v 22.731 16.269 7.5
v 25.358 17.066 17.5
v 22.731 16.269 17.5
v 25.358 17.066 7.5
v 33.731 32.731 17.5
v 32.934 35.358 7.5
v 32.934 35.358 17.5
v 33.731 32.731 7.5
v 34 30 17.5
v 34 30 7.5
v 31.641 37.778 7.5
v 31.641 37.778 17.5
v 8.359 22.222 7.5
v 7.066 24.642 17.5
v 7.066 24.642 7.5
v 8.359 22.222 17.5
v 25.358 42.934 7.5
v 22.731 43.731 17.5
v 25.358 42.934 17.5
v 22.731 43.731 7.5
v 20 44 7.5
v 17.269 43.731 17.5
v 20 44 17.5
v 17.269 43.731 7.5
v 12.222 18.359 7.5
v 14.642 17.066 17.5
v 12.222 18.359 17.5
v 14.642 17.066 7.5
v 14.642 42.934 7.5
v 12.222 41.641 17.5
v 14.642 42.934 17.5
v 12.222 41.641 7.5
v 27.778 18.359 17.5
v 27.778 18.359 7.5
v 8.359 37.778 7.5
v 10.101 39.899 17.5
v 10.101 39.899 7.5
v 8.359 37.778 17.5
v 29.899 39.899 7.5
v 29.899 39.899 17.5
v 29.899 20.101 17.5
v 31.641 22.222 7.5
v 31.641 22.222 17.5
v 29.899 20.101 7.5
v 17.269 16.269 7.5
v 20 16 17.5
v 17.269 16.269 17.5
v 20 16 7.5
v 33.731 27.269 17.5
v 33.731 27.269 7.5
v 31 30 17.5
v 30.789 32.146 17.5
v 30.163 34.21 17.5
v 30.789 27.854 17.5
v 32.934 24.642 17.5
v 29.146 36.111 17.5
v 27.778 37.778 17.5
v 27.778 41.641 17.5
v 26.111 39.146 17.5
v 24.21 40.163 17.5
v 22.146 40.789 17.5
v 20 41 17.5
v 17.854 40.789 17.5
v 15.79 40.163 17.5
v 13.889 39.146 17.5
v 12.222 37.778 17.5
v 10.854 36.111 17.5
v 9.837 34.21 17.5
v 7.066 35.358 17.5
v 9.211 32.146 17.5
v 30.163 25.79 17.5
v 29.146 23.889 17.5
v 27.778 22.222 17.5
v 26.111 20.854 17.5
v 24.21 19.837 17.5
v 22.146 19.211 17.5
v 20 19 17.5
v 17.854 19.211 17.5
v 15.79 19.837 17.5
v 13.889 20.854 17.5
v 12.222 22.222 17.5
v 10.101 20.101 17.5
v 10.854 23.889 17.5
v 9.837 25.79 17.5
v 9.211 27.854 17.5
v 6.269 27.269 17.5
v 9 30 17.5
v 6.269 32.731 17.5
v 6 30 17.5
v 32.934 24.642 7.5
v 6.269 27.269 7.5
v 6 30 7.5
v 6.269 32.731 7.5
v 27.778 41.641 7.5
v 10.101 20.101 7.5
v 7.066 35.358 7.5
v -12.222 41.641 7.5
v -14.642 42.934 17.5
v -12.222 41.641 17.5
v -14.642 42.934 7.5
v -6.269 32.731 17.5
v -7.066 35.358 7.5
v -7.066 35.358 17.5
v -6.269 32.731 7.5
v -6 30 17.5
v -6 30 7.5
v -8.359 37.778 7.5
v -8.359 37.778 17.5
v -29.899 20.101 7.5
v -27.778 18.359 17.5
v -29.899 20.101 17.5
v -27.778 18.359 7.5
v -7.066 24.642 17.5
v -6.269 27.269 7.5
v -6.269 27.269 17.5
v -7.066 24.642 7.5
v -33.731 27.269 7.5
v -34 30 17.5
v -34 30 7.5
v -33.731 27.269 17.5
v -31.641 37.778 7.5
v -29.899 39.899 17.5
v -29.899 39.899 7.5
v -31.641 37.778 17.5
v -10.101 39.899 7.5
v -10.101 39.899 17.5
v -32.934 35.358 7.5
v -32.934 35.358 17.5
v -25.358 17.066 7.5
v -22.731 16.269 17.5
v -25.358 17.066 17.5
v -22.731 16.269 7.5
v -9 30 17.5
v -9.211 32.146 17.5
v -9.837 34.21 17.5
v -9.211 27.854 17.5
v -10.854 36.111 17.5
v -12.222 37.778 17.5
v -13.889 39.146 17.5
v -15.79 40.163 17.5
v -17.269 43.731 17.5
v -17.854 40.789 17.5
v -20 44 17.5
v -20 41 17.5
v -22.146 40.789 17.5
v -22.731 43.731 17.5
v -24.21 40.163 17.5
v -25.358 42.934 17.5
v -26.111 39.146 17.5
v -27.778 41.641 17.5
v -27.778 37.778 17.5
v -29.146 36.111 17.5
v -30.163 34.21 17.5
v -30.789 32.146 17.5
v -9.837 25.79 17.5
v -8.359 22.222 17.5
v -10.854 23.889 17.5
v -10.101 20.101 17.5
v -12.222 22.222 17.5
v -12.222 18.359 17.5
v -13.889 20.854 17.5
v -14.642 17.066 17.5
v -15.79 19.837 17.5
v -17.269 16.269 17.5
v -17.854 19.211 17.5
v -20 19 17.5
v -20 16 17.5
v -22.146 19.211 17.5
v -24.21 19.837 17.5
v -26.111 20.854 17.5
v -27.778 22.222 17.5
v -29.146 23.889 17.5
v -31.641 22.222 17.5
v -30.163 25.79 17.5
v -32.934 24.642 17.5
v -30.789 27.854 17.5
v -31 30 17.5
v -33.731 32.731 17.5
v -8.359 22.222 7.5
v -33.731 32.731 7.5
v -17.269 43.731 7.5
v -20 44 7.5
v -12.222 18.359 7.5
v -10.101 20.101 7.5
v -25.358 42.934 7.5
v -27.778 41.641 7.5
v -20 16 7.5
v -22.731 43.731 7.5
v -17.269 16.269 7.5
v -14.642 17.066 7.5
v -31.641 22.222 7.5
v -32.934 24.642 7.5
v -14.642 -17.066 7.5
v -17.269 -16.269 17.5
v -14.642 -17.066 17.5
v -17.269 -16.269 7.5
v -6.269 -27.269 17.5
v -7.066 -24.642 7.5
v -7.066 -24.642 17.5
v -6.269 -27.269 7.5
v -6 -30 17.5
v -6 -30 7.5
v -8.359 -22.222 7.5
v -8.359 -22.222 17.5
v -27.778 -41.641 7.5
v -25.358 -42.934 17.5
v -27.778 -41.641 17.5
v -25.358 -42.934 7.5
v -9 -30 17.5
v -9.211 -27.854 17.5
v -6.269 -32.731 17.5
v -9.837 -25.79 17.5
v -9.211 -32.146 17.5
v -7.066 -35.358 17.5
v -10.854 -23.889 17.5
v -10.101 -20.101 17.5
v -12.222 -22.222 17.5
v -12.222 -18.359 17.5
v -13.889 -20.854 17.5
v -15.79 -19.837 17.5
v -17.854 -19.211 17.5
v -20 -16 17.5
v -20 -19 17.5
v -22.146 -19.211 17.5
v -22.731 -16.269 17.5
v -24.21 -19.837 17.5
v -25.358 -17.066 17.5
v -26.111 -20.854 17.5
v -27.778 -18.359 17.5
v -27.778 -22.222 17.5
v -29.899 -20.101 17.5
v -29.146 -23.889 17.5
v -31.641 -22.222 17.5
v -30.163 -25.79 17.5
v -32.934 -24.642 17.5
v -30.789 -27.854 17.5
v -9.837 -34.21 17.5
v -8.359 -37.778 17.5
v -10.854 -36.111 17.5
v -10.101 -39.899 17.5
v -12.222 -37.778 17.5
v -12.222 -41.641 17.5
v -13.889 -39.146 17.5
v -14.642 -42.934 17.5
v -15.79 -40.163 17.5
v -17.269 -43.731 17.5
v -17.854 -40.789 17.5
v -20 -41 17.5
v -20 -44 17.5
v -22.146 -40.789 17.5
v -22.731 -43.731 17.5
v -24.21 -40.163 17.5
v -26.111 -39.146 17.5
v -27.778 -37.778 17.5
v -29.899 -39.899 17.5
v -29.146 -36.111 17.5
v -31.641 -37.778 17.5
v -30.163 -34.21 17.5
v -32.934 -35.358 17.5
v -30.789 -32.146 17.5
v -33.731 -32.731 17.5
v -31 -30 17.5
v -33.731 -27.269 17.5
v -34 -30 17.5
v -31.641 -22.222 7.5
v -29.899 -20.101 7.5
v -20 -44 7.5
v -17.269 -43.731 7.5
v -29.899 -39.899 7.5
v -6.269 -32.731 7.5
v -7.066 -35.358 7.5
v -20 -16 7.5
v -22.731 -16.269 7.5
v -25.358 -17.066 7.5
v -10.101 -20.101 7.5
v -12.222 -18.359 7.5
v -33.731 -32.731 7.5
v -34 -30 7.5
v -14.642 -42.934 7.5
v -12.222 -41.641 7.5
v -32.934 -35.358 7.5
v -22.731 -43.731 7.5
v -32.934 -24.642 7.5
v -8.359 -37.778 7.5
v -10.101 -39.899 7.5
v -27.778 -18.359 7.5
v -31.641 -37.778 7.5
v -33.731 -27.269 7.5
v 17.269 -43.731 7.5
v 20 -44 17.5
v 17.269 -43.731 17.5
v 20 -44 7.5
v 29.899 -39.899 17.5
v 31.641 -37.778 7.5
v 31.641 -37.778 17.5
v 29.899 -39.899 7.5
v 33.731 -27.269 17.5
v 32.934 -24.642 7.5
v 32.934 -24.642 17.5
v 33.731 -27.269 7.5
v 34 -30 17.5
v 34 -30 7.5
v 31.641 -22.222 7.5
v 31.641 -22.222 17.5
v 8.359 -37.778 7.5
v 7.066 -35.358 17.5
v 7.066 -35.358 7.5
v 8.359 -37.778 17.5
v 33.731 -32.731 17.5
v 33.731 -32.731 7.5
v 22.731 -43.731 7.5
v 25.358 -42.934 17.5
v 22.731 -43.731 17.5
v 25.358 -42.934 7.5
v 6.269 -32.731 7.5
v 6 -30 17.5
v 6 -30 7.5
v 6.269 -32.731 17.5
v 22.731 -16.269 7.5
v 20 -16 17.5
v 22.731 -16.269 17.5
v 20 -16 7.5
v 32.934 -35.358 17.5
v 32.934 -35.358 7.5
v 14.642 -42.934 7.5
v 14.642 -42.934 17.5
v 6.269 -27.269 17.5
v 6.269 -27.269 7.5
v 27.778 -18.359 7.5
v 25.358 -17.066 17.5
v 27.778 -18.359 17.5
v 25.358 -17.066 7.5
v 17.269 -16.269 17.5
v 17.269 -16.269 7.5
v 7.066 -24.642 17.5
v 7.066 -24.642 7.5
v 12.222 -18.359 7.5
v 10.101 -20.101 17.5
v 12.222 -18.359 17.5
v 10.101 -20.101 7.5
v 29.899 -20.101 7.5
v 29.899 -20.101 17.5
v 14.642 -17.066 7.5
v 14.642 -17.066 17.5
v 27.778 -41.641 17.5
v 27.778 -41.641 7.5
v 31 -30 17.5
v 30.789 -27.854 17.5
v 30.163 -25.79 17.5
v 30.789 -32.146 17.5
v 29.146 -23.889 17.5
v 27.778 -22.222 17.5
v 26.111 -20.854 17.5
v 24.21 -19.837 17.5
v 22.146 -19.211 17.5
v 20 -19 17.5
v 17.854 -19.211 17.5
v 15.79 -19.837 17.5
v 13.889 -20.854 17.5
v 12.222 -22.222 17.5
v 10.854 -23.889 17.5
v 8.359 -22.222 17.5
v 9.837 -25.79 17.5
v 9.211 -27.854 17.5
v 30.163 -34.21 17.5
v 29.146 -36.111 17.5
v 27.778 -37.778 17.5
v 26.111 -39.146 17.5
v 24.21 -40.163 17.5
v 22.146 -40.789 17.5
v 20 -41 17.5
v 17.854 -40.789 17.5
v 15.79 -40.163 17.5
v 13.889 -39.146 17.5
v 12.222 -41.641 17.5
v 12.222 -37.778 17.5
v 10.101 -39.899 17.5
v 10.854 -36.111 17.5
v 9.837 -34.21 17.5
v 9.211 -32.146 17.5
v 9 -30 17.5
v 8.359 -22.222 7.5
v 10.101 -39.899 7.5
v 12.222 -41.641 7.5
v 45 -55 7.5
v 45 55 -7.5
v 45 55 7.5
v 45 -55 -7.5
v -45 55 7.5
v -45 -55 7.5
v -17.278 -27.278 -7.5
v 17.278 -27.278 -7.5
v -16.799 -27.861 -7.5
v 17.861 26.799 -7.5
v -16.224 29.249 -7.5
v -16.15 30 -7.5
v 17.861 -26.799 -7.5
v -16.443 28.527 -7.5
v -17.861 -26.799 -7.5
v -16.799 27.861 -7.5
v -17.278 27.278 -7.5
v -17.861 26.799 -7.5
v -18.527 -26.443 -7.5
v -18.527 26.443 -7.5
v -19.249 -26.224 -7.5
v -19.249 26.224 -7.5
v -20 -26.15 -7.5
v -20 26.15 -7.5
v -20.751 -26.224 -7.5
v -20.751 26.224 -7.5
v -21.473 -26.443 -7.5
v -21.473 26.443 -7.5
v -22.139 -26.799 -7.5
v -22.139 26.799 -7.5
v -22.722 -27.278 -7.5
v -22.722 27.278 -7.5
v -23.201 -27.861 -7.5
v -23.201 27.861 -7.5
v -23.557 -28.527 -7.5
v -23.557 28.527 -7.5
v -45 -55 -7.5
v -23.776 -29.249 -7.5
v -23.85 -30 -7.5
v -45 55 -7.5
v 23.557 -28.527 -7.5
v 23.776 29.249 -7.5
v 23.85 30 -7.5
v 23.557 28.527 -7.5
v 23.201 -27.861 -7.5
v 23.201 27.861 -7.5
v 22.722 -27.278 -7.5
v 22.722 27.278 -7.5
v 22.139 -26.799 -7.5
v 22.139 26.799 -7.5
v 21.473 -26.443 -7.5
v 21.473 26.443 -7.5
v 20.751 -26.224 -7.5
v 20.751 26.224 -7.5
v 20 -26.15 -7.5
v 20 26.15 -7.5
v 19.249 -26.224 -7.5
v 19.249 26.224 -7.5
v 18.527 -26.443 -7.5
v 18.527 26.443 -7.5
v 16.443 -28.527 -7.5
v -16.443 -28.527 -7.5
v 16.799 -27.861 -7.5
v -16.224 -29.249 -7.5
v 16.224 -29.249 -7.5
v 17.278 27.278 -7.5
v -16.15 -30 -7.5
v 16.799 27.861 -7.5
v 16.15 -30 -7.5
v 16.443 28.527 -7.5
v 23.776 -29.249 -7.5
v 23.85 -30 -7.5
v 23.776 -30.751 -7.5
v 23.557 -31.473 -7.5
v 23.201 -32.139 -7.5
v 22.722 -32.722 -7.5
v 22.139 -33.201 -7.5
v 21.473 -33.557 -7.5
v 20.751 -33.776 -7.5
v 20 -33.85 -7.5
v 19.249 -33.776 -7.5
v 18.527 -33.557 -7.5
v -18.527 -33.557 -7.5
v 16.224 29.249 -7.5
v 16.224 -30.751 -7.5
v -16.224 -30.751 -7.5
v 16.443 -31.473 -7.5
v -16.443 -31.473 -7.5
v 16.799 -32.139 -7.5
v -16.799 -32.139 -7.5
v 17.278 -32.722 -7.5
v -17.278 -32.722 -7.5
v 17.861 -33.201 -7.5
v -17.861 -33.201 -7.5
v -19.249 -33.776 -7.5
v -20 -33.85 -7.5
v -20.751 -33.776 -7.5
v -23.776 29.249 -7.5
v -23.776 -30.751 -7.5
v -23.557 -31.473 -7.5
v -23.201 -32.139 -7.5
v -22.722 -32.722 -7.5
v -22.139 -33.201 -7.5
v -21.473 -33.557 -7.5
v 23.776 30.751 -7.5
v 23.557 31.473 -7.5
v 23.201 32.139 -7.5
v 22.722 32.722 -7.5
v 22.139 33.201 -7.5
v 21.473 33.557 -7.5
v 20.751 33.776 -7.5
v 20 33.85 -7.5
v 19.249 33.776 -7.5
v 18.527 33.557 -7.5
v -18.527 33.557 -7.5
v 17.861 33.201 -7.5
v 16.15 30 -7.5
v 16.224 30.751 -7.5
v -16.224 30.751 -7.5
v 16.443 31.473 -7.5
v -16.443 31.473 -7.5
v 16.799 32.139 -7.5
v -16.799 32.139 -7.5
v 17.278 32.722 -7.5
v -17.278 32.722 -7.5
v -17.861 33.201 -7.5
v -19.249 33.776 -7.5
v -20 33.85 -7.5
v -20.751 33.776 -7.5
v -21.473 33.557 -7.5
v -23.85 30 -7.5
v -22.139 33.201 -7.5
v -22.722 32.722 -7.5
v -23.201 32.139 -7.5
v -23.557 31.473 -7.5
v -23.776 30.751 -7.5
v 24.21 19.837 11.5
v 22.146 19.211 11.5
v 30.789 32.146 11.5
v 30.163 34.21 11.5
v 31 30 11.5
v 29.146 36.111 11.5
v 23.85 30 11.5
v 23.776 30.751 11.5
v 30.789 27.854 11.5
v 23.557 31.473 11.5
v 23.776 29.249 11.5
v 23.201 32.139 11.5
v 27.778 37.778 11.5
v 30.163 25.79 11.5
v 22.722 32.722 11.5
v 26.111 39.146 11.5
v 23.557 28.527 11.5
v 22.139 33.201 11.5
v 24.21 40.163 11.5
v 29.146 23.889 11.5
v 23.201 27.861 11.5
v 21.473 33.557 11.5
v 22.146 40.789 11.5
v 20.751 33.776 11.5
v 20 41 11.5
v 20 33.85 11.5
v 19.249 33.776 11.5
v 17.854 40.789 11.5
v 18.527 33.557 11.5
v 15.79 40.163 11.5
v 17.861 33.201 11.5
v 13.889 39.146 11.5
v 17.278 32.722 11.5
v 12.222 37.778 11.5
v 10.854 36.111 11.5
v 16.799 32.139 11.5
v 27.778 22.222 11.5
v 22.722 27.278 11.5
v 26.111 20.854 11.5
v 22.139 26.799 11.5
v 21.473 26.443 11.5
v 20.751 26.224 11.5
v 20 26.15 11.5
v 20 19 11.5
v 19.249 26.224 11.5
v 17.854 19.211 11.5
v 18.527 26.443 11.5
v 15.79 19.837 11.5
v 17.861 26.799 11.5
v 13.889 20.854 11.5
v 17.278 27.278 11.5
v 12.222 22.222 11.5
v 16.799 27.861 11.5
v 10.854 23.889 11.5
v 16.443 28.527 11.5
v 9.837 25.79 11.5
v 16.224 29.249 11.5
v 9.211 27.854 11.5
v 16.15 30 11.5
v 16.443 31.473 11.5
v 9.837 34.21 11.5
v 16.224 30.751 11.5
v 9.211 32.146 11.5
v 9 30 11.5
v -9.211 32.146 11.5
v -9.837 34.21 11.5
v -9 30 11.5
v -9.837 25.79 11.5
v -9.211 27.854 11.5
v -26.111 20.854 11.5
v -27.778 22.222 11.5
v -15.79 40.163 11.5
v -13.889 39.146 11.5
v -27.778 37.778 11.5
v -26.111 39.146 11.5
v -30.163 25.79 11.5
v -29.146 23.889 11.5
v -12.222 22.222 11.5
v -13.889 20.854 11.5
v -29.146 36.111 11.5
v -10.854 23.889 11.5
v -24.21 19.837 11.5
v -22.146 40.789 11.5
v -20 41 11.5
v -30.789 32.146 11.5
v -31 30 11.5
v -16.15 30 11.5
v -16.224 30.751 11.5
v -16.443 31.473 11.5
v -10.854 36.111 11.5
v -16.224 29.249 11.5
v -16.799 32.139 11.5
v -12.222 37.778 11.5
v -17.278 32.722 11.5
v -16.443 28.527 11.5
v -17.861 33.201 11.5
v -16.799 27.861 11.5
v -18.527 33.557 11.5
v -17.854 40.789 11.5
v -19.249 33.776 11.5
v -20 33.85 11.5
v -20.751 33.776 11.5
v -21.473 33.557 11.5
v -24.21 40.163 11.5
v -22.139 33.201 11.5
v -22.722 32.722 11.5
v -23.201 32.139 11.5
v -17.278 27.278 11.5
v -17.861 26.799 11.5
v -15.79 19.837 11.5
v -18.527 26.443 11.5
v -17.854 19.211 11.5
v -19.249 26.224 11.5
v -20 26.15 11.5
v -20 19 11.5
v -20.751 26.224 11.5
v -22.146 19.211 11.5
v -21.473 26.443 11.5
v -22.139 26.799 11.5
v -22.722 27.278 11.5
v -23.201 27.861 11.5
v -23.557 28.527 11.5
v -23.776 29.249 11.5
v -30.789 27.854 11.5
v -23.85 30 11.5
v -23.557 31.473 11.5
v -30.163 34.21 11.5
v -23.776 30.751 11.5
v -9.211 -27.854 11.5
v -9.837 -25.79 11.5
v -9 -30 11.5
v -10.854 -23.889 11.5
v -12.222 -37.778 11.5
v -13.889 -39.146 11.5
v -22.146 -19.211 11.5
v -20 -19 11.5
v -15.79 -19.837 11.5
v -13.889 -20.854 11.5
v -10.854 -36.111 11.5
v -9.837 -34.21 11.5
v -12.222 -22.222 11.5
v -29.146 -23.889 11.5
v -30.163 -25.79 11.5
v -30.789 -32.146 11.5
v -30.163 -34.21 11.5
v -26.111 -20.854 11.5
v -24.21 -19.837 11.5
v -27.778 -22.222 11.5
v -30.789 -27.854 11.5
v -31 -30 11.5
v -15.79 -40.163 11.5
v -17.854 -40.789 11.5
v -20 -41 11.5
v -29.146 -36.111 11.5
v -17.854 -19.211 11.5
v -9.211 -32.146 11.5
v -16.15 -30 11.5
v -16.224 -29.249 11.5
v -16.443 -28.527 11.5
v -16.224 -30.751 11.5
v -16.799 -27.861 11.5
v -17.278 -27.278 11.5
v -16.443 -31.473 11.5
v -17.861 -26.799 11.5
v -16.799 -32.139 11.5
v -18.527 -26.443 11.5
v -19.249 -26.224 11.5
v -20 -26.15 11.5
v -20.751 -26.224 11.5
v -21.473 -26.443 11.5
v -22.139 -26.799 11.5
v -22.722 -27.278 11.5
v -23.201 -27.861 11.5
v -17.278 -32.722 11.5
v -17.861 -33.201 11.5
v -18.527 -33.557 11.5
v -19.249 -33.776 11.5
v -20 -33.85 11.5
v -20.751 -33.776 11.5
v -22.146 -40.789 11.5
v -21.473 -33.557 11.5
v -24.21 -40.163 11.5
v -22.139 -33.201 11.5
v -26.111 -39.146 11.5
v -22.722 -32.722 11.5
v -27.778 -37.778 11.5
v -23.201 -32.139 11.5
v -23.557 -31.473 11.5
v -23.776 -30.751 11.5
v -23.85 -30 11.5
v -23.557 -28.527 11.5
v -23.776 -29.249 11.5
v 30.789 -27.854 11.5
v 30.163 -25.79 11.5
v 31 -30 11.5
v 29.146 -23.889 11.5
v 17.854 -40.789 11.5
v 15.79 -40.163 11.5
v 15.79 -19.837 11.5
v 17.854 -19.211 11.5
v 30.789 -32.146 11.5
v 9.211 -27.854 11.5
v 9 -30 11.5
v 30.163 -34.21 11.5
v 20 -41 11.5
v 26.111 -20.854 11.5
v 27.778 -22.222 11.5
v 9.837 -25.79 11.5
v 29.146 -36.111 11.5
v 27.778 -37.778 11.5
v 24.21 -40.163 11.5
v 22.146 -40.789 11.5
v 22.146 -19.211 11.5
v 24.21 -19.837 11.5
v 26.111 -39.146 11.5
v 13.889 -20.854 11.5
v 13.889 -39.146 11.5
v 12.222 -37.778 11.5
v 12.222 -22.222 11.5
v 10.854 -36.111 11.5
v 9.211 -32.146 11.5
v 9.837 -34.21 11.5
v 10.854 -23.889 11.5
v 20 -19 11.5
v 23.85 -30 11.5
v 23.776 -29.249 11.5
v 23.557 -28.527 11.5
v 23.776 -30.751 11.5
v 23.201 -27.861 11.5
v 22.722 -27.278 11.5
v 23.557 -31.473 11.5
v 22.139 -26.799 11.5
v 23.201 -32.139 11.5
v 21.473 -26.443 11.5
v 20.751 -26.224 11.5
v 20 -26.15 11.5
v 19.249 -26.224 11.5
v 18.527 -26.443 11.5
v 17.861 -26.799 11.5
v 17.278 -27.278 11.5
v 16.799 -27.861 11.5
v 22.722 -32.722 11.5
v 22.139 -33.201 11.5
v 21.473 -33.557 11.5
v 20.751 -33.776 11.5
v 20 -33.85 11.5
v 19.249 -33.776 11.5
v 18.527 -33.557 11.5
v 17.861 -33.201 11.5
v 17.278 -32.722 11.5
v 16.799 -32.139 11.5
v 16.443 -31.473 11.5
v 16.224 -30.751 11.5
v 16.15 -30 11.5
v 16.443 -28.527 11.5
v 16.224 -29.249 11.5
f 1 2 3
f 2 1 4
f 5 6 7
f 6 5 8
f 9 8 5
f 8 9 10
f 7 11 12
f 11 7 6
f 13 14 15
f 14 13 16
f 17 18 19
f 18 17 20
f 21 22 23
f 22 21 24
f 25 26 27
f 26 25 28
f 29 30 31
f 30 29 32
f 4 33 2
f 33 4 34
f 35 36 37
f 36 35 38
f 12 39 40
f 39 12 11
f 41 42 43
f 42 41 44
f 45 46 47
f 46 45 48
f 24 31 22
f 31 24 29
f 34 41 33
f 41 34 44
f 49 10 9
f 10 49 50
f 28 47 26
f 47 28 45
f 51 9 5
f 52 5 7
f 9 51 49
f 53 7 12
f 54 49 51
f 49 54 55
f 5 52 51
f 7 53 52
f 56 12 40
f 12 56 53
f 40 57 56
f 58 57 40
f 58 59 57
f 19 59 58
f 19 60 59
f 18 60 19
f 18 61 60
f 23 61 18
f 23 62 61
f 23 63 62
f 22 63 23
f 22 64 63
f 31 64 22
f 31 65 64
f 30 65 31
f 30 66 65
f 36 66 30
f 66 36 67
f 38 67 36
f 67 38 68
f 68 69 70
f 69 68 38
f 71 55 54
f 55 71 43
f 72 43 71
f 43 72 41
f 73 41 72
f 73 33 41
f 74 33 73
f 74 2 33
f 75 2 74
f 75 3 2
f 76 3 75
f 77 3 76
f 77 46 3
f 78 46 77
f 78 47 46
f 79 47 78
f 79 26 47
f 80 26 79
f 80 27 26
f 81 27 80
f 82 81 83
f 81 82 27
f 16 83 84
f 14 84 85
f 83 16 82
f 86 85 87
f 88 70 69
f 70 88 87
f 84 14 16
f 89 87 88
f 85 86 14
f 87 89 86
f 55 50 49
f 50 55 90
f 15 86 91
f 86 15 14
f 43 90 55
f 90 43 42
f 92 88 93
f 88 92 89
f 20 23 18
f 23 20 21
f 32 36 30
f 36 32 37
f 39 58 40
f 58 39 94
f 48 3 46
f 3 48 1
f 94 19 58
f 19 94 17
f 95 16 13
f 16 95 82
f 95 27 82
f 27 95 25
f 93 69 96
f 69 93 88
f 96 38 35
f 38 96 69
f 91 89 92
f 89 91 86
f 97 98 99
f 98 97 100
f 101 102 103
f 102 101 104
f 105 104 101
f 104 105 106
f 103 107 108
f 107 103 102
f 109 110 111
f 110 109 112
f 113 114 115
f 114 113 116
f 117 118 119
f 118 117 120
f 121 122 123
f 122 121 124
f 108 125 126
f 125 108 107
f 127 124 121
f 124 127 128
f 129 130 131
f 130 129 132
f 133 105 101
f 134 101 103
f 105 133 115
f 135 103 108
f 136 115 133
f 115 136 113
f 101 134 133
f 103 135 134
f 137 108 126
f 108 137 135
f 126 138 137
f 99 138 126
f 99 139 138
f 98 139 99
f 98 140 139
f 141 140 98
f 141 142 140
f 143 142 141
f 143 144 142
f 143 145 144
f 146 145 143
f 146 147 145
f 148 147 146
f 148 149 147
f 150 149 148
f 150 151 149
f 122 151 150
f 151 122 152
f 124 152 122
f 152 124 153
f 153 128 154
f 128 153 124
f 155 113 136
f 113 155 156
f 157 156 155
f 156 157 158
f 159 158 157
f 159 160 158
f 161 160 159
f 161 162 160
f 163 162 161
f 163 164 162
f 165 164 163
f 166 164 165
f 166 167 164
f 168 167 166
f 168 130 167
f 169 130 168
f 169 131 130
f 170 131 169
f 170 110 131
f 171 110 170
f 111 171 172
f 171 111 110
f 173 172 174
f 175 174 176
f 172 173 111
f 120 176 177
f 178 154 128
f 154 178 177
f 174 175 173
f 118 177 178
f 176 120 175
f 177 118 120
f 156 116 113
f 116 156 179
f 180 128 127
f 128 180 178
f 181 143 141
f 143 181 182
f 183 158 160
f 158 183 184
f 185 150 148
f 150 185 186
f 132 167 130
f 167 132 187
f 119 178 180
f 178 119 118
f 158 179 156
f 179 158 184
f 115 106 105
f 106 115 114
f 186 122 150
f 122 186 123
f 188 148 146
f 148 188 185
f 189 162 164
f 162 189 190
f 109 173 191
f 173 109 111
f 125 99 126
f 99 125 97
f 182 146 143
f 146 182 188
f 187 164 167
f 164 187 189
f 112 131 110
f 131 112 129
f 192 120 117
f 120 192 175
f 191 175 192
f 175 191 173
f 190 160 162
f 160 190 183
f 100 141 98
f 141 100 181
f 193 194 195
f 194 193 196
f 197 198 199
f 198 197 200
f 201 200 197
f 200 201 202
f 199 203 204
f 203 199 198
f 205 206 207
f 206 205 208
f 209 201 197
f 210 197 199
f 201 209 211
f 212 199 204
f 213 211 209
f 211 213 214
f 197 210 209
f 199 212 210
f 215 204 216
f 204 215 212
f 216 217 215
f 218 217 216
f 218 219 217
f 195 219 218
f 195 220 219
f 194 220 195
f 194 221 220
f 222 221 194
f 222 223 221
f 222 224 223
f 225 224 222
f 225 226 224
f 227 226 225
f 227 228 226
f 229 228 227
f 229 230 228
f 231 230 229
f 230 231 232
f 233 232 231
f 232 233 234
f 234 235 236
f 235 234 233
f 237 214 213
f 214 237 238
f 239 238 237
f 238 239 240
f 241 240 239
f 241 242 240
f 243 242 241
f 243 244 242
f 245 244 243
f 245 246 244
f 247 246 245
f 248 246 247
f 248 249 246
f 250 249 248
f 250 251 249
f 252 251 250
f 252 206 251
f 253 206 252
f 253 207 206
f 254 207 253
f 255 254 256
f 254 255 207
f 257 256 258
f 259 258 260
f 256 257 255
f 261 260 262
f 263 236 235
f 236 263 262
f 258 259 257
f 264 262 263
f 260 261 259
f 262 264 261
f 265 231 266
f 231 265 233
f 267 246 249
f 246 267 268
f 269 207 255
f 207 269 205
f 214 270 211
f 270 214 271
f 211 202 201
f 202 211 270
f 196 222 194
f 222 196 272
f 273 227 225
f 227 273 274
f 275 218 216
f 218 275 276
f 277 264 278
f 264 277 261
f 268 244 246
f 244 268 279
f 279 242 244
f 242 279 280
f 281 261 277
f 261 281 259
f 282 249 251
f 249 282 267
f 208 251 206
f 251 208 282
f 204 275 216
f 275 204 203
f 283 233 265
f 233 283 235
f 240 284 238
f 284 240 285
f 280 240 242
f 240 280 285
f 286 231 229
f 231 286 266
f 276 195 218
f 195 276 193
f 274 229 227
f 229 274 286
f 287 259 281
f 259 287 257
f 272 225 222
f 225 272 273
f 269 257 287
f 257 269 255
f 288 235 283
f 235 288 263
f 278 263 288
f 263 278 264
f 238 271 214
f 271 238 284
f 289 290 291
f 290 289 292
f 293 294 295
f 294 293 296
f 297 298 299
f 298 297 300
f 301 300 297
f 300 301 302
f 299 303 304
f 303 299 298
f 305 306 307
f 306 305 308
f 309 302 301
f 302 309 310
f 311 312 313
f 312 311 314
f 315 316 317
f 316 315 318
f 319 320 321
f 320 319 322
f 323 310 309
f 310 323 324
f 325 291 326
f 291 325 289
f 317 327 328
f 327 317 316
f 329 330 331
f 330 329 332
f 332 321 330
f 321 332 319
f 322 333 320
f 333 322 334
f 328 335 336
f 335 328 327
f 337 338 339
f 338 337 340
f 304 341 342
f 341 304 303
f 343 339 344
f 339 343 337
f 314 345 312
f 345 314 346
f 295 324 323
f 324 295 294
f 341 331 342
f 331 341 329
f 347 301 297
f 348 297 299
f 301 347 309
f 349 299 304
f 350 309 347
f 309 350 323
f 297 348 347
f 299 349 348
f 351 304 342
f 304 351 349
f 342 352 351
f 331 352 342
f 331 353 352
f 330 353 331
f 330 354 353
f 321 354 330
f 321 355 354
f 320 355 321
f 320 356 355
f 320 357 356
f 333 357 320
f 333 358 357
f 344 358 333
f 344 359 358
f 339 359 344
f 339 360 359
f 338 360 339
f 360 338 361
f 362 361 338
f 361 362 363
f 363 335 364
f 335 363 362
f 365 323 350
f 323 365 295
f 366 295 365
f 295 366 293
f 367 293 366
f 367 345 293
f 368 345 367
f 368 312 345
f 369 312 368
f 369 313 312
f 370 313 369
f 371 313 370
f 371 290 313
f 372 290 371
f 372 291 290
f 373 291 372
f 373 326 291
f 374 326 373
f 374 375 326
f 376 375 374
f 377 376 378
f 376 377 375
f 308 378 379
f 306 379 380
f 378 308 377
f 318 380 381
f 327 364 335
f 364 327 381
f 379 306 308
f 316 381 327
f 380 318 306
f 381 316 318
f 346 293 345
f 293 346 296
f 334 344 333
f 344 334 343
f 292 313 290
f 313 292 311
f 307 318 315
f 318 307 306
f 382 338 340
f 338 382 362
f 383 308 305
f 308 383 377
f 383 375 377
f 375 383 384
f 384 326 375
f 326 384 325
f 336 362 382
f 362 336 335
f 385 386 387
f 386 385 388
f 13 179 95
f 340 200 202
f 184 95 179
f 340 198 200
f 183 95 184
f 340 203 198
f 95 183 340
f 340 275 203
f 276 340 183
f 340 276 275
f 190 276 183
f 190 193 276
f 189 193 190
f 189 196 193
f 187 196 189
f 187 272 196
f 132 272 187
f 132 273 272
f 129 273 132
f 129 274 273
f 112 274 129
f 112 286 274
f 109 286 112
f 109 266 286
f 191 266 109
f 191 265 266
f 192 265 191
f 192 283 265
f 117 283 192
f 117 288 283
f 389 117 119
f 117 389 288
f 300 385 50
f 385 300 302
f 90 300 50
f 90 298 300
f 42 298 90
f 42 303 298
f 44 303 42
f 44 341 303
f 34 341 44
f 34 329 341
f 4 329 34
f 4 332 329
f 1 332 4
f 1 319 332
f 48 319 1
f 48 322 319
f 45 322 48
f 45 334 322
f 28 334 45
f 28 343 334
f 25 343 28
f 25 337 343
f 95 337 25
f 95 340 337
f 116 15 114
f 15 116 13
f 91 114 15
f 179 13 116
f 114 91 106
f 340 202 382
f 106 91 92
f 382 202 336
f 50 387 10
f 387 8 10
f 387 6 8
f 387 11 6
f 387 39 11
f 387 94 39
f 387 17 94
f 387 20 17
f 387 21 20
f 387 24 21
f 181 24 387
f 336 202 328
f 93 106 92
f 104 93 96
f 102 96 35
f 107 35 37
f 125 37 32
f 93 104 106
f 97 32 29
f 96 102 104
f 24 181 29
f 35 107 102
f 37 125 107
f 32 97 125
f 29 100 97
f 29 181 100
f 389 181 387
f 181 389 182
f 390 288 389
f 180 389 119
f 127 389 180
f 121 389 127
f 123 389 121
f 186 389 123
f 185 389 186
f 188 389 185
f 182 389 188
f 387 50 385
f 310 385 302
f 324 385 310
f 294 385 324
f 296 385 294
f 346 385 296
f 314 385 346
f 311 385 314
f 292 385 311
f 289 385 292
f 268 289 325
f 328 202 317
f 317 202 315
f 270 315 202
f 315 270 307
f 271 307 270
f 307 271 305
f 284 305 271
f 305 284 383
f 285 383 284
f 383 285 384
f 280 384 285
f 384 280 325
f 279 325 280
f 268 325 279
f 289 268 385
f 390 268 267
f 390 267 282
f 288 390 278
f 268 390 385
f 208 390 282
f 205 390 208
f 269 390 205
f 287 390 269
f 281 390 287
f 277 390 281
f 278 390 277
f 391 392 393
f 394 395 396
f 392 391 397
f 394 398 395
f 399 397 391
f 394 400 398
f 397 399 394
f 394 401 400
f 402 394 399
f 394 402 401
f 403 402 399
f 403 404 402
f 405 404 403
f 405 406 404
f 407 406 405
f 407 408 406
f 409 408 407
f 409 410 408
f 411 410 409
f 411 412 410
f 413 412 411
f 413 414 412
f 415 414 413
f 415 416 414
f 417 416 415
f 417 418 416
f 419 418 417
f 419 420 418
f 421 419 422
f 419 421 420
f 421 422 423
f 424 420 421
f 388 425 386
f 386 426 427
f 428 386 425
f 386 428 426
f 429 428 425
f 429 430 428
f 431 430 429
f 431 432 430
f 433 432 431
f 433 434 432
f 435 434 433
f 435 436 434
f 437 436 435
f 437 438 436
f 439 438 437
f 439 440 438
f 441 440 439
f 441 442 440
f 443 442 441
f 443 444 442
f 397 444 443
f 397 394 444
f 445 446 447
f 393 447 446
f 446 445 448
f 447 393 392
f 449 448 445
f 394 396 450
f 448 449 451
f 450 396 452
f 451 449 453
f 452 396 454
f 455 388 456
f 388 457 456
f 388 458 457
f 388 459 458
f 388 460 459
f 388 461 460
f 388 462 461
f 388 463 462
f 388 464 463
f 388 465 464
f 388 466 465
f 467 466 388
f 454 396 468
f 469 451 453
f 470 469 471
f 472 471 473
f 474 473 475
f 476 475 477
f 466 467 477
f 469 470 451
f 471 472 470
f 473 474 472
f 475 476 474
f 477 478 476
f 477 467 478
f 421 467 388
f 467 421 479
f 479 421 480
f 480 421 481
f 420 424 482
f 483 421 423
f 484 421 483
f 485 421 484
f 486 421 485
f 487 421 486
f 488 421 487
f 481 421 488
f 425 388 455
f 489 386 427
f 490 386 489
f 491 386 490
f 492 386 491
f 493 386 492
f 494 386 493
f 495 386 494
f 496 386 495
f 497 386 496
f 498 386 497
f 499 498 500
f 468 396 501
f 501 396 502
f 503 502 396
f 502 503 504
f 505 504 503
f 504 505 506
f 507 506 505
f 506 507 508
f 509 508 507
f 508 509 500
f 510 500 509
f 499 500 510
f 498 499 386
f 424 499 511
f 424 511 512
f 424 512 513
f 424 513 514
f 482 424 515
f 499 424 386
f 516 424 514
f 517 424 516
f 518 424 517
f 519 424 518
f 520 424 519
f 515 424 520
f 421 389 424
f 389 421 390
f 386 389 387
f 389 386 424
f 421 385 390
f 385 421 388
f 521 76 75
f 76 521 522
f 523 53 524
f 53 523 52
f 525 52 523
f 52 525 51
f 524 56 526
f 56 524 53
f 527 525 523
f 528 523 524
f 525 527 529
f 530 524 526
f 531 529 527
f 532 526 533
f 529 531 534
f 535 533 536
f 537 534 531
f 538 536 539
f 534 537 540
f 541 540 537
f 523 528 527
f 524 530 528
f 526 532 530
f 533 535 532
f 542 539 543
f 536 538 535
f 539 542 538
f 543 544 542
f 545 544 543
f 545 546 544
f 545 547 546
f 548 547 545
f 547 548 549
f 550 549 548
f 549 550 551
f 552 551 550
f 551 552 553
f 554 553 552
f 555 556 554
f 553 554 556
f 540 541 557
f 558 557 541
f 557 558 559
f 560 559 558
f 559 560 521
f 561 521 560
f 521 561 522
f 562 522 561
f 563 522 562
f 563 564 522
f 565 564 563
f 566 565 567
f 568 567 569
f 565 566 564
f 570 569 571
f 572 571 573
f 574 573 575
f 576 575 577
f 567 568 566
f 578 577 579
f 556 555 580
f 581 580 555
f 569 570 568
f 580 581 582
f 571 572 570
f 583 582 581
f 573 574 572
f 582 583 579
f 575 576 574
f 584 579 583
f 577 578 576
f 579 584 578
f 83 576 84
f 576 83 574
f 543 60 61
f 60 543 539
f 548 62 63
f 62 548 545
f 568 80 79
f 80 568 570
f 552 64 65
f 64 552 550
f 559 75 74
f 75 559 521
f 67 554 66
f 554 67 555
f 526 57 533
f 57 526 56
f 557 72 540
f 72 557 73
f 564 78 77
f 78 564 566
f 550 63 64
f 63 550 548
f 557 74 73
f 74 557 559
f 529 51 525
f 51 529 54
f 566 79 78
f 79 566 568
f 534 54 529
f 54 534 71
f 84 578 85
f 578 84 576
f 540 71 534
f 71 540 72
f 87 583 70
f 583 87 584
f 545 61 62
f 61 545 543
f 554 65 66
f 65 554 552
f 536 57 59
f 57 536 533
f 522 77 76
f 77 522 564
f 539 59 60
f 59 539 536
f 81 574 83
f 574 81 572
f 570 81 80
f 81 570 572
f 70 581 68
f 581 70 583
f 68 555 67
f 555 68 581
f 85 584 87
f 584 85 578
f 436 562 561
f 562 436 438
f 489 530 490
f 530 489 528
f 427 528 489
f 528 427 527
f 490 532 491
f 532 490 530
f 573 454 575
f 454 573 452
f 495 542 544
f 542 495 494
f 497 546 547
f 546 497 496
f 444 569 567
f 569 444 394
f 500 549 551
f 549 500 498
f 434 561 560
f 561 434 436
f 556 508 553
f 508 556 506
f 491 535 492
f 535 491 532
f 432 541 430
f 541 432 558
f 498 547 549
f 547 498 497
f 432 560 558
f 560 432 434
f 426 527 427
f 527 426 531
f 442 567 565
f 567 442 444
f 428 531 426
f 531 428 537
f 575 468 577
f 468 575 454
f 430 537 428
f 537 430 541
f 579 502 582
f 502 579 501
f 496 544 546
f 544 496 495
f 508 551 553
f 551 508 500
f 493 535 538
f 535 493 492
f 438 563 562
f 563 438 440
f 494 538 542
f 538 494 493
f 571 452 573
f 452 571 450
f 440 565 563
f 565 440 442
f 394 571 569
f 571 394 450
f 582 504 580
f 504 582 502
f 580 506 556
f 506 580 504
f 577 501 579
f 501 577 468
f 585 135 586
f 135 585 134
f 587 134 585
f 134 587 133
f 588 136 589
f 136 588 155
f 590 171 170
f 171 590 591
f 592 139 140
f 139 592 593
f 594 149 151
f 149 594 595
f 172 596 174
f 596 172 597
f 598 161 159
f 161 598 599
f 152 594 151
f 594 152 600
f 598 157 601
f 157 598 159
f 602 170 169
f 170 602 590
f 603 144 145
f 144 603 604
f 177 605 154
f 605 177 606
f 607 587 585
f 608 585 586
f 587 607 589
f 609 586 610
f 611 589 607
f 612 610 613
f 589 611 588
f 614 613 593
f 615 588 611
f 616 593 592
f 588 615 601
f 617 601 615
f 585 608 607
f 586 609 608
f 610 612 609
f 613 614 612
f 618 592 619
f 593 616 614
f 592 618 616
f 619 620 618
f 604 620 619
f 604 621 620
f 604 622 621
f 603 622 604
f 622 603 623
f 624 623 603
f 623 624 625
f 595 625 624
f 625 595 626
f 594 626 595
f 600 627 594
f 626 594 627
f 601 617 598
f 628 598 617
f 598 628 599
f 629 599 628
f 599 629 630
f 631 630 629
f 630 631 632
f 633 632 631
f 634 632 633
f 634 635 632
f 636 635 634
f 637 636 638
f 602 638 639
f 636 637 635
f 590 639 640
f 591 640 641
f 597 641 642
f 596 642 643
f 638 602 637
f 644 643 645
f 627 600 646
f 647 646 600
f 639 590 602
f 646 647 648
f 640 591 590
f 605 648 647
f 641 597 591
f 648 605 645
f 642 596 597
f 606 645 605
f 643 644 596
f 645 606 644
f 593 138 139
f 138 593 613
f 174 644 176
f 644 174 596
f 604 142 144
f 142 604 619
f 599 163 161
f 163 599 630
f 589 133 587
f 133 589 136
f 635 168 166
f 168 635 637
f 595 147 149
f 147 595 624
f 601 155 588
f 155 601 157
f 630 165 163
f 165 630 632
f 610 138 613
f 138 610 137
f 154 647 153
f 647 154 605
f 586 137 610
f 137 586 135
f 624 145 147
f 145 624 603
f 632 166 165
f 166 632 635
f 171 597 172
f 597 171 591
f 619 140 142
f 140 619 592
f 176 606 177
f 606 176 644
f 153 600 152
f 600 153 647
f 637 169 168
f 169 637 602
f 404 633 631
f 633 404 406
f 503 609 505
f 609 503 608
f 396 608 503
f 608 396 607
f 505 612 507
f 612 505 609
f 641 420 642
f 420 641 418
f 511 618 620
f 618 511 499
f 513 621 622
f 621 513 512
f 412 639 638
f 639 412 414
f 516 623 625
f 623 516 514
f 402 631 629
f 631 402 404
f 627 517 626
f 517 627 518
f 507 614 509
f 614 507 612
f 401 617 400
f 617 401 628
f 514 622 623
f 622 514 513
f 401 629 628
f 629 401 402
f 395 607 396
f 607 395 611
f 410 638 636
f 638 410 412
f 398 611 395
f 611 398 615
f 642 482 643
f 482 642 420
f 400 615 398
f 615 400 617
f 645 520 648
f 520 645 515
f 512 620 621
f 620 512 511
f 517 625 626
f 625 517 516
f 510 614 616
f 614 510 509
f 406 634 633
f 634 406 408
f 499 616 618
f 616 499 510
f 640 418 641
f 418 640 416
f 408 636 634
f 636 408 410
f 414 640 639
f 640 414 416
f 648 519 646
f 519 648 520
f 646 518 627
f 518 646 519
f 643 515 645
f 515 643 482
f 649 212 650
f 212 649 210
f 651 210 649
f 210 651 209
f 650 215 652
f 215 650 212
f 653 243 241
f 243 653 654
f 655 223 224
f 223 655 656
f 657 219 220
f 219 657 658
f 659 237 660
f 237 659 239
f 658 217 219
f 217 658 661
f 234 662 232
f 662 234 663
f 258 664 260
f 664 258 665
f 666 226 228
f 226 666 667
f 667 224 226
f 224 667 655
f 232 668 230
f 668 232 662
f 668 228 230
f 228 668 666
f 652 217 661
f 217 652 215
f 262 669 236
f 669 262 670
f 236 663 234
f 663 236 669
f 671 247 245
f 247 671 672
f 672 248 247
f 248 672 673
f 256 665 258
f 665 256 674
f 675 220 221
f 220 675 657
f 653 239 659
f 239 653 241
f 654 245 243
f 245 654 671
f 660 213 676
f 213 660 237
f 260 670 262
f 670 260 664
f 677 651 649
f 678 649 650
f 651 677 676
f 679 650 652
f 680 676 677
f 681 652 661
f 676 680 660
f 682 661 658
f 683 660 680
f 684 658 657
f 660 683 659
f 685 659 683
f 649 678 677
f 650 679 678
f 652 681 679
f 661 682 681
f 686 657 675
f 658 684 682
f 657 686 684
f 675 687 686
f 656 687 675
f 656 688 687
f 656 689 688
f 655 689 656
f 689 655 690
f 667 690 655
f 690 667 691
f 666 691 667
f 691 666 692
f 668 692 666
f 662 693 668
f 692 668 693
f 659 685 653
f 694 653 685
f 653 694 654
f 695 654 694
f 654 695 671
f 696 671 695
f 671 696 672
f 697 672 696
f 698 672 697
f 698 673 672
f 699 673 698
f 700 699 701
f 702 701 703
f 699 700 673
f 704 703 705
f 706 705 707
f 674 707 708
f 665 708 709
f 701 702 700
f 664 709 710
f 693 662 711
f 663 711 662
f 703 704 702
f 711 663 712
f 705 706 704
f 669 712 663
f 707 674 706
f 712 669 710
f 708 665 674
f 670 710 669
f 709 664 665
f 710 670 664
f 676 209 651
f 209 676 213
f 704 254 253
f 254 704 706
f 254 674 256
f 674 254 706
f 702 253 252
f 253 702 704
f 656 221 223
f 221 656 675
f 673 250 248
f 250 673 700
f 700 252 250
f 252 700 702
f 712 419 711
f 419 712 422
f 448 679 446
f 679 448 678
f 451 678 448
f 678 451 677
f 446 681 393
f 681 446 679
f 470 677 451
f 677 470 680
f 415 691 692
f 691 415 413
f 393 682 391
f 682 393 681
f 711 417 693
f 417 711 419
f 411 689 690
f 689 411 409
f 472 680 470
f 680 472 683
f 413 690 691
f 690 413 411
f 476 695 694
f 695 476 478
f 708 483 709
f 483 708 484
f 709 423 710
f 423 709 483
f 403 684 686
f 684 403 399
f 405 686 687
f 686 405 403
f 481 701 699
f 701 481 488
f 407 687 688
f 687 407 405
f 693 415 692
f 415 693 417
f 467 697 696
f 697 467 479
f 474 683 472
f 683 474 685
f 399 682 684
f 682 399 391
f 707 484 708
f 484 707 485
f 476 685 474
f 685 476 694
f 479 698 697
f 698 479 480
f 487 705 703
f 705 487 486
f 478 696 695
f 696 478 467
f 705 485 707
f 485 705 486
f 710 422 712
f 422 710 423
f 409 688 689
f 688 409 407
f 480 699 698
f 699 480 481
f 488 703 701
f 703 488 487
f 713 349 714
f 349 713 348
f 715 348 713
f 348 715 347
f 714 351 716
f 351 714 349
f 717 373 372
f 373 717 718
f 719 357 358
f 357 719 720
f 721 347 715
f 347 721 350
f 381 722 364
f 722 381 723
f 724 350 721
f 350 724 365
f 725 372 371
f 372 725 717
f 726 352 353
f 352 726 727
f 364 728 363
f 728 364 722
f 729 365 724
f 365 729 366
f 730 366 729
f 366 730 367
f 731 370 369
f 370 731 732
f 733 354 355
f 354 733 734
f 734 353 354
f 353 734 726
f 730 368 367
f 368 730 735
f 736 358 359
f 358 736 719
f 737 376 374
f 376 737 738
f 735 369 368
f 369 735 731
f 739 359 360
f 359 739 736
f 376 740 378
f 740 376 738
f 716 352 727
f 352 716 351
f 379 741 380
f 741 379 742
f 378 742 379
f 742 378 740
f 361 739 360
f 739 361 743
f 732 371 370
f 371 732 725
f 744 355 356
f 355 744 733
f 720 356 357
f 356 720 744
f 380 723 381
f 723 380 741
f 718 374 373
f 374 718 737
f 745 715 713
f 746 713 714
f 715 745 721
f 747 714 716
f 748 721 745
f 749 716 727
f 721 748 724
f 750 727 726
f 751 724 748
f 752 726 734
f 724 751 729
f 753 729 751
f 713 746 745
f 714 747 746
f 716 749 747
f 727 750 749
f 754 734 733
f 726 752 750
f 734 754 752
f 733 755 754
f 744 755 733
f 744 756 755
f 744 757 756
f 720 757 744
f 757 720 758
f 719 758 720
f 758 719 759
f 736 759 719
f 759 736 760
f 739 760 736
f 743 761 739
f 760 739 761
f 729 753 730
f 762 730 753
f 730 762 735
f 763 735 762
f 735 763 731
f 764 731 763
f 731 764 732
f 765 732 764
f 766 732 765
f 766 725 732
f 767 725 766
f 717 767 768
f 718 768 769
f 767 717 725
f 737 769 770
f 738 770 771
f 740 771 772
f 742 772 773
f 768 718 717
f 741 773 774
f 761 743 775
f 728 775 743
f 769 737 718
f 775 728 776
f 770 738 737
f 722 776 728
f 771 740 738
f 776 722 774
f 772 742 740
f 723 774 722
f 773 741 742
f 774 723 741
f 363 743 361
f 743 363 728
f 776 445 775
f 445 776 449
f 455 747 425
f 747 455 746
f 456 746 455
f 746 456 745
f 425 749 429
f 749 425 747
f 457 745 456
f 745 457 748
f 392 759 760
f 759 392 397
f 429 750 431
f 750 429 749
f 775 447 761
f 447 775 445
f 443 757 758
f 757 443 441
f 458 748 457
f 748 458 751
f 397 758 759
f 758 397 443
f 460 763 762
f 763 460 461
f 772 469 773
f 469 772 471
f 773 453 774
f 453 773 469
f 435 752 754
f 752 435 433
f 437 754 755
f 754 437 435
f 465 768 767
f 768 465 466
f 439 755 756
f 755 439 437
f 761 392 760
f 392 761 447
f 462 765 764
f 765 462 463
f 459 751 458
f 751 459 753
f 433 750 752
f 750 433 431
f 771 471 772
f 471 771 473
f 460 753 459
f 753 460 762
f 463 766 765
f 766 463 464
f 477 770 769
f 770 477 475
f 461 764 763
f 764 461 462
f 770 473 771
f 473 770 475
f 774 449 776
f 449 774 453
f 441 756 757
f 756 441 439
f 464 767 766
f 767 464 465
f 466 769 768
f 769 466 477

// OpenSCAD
$fn = 32;

// ----------------------------------------------------------------------
// Socket pad plate
// bosses with counterbored sockets for the screws
// ----------------------------------------------------------------------

// --- parameters (mm) ---
base_t = 15;            // base plate thickness
boss_h = 10;            // boss height above the base plate
boss_d = 28;            // boss diameter
socket_d = 22;          // socket diameter
socket_depth = 6;       // socket depth from the boss face
bolt_d = 7.7;           // screw clearance hole through the socket floor
plate = [90, 110, 15];  // overall size (x, y, z)
edge = 25;              // boss centre offset from the plate edge
pads = 4;               // boss count, one per corner

// --- derived feature positions (mm) ---
height = base_t + boss_h;        // = 25   overall height of the part
corner_x = plate[0] / 2 - edge;  // = 20   boss centre X
corner_y = plate[1] / 2 - edge;  // = 30   boss centre Y
feature_centers = [
  [corner_x, corner_y],
  [-corner_x, corner_y],
  [-corner_x, -corner_y],
  [corner_x, -corner_y]
];   // boss centres: sockets, holes and the pads themselves are placed from here

// base plate, bosses on feature_centers, socket + through hole in each
difference() {
  union() {
    cube(plate, center = true);
    for (centre = feature_centers)
      translate([centre[0], centre[1], plate[2] / 2 - 1])
        cylinder(d = boss_d, h = boss_h + 1);
  }
  for (centre = feature_centers) {
    translate([centre[0], centre[1], plate[2] / 2 + boss_h - socket_depth])
      cylinder(d = socket_d, h = socket_depth + 1);
    translate([centre[0], centre[1], -height])
      cylinder(d = bolt_d, h = 2 * height + 2);  // through the socket floor
  }
}
